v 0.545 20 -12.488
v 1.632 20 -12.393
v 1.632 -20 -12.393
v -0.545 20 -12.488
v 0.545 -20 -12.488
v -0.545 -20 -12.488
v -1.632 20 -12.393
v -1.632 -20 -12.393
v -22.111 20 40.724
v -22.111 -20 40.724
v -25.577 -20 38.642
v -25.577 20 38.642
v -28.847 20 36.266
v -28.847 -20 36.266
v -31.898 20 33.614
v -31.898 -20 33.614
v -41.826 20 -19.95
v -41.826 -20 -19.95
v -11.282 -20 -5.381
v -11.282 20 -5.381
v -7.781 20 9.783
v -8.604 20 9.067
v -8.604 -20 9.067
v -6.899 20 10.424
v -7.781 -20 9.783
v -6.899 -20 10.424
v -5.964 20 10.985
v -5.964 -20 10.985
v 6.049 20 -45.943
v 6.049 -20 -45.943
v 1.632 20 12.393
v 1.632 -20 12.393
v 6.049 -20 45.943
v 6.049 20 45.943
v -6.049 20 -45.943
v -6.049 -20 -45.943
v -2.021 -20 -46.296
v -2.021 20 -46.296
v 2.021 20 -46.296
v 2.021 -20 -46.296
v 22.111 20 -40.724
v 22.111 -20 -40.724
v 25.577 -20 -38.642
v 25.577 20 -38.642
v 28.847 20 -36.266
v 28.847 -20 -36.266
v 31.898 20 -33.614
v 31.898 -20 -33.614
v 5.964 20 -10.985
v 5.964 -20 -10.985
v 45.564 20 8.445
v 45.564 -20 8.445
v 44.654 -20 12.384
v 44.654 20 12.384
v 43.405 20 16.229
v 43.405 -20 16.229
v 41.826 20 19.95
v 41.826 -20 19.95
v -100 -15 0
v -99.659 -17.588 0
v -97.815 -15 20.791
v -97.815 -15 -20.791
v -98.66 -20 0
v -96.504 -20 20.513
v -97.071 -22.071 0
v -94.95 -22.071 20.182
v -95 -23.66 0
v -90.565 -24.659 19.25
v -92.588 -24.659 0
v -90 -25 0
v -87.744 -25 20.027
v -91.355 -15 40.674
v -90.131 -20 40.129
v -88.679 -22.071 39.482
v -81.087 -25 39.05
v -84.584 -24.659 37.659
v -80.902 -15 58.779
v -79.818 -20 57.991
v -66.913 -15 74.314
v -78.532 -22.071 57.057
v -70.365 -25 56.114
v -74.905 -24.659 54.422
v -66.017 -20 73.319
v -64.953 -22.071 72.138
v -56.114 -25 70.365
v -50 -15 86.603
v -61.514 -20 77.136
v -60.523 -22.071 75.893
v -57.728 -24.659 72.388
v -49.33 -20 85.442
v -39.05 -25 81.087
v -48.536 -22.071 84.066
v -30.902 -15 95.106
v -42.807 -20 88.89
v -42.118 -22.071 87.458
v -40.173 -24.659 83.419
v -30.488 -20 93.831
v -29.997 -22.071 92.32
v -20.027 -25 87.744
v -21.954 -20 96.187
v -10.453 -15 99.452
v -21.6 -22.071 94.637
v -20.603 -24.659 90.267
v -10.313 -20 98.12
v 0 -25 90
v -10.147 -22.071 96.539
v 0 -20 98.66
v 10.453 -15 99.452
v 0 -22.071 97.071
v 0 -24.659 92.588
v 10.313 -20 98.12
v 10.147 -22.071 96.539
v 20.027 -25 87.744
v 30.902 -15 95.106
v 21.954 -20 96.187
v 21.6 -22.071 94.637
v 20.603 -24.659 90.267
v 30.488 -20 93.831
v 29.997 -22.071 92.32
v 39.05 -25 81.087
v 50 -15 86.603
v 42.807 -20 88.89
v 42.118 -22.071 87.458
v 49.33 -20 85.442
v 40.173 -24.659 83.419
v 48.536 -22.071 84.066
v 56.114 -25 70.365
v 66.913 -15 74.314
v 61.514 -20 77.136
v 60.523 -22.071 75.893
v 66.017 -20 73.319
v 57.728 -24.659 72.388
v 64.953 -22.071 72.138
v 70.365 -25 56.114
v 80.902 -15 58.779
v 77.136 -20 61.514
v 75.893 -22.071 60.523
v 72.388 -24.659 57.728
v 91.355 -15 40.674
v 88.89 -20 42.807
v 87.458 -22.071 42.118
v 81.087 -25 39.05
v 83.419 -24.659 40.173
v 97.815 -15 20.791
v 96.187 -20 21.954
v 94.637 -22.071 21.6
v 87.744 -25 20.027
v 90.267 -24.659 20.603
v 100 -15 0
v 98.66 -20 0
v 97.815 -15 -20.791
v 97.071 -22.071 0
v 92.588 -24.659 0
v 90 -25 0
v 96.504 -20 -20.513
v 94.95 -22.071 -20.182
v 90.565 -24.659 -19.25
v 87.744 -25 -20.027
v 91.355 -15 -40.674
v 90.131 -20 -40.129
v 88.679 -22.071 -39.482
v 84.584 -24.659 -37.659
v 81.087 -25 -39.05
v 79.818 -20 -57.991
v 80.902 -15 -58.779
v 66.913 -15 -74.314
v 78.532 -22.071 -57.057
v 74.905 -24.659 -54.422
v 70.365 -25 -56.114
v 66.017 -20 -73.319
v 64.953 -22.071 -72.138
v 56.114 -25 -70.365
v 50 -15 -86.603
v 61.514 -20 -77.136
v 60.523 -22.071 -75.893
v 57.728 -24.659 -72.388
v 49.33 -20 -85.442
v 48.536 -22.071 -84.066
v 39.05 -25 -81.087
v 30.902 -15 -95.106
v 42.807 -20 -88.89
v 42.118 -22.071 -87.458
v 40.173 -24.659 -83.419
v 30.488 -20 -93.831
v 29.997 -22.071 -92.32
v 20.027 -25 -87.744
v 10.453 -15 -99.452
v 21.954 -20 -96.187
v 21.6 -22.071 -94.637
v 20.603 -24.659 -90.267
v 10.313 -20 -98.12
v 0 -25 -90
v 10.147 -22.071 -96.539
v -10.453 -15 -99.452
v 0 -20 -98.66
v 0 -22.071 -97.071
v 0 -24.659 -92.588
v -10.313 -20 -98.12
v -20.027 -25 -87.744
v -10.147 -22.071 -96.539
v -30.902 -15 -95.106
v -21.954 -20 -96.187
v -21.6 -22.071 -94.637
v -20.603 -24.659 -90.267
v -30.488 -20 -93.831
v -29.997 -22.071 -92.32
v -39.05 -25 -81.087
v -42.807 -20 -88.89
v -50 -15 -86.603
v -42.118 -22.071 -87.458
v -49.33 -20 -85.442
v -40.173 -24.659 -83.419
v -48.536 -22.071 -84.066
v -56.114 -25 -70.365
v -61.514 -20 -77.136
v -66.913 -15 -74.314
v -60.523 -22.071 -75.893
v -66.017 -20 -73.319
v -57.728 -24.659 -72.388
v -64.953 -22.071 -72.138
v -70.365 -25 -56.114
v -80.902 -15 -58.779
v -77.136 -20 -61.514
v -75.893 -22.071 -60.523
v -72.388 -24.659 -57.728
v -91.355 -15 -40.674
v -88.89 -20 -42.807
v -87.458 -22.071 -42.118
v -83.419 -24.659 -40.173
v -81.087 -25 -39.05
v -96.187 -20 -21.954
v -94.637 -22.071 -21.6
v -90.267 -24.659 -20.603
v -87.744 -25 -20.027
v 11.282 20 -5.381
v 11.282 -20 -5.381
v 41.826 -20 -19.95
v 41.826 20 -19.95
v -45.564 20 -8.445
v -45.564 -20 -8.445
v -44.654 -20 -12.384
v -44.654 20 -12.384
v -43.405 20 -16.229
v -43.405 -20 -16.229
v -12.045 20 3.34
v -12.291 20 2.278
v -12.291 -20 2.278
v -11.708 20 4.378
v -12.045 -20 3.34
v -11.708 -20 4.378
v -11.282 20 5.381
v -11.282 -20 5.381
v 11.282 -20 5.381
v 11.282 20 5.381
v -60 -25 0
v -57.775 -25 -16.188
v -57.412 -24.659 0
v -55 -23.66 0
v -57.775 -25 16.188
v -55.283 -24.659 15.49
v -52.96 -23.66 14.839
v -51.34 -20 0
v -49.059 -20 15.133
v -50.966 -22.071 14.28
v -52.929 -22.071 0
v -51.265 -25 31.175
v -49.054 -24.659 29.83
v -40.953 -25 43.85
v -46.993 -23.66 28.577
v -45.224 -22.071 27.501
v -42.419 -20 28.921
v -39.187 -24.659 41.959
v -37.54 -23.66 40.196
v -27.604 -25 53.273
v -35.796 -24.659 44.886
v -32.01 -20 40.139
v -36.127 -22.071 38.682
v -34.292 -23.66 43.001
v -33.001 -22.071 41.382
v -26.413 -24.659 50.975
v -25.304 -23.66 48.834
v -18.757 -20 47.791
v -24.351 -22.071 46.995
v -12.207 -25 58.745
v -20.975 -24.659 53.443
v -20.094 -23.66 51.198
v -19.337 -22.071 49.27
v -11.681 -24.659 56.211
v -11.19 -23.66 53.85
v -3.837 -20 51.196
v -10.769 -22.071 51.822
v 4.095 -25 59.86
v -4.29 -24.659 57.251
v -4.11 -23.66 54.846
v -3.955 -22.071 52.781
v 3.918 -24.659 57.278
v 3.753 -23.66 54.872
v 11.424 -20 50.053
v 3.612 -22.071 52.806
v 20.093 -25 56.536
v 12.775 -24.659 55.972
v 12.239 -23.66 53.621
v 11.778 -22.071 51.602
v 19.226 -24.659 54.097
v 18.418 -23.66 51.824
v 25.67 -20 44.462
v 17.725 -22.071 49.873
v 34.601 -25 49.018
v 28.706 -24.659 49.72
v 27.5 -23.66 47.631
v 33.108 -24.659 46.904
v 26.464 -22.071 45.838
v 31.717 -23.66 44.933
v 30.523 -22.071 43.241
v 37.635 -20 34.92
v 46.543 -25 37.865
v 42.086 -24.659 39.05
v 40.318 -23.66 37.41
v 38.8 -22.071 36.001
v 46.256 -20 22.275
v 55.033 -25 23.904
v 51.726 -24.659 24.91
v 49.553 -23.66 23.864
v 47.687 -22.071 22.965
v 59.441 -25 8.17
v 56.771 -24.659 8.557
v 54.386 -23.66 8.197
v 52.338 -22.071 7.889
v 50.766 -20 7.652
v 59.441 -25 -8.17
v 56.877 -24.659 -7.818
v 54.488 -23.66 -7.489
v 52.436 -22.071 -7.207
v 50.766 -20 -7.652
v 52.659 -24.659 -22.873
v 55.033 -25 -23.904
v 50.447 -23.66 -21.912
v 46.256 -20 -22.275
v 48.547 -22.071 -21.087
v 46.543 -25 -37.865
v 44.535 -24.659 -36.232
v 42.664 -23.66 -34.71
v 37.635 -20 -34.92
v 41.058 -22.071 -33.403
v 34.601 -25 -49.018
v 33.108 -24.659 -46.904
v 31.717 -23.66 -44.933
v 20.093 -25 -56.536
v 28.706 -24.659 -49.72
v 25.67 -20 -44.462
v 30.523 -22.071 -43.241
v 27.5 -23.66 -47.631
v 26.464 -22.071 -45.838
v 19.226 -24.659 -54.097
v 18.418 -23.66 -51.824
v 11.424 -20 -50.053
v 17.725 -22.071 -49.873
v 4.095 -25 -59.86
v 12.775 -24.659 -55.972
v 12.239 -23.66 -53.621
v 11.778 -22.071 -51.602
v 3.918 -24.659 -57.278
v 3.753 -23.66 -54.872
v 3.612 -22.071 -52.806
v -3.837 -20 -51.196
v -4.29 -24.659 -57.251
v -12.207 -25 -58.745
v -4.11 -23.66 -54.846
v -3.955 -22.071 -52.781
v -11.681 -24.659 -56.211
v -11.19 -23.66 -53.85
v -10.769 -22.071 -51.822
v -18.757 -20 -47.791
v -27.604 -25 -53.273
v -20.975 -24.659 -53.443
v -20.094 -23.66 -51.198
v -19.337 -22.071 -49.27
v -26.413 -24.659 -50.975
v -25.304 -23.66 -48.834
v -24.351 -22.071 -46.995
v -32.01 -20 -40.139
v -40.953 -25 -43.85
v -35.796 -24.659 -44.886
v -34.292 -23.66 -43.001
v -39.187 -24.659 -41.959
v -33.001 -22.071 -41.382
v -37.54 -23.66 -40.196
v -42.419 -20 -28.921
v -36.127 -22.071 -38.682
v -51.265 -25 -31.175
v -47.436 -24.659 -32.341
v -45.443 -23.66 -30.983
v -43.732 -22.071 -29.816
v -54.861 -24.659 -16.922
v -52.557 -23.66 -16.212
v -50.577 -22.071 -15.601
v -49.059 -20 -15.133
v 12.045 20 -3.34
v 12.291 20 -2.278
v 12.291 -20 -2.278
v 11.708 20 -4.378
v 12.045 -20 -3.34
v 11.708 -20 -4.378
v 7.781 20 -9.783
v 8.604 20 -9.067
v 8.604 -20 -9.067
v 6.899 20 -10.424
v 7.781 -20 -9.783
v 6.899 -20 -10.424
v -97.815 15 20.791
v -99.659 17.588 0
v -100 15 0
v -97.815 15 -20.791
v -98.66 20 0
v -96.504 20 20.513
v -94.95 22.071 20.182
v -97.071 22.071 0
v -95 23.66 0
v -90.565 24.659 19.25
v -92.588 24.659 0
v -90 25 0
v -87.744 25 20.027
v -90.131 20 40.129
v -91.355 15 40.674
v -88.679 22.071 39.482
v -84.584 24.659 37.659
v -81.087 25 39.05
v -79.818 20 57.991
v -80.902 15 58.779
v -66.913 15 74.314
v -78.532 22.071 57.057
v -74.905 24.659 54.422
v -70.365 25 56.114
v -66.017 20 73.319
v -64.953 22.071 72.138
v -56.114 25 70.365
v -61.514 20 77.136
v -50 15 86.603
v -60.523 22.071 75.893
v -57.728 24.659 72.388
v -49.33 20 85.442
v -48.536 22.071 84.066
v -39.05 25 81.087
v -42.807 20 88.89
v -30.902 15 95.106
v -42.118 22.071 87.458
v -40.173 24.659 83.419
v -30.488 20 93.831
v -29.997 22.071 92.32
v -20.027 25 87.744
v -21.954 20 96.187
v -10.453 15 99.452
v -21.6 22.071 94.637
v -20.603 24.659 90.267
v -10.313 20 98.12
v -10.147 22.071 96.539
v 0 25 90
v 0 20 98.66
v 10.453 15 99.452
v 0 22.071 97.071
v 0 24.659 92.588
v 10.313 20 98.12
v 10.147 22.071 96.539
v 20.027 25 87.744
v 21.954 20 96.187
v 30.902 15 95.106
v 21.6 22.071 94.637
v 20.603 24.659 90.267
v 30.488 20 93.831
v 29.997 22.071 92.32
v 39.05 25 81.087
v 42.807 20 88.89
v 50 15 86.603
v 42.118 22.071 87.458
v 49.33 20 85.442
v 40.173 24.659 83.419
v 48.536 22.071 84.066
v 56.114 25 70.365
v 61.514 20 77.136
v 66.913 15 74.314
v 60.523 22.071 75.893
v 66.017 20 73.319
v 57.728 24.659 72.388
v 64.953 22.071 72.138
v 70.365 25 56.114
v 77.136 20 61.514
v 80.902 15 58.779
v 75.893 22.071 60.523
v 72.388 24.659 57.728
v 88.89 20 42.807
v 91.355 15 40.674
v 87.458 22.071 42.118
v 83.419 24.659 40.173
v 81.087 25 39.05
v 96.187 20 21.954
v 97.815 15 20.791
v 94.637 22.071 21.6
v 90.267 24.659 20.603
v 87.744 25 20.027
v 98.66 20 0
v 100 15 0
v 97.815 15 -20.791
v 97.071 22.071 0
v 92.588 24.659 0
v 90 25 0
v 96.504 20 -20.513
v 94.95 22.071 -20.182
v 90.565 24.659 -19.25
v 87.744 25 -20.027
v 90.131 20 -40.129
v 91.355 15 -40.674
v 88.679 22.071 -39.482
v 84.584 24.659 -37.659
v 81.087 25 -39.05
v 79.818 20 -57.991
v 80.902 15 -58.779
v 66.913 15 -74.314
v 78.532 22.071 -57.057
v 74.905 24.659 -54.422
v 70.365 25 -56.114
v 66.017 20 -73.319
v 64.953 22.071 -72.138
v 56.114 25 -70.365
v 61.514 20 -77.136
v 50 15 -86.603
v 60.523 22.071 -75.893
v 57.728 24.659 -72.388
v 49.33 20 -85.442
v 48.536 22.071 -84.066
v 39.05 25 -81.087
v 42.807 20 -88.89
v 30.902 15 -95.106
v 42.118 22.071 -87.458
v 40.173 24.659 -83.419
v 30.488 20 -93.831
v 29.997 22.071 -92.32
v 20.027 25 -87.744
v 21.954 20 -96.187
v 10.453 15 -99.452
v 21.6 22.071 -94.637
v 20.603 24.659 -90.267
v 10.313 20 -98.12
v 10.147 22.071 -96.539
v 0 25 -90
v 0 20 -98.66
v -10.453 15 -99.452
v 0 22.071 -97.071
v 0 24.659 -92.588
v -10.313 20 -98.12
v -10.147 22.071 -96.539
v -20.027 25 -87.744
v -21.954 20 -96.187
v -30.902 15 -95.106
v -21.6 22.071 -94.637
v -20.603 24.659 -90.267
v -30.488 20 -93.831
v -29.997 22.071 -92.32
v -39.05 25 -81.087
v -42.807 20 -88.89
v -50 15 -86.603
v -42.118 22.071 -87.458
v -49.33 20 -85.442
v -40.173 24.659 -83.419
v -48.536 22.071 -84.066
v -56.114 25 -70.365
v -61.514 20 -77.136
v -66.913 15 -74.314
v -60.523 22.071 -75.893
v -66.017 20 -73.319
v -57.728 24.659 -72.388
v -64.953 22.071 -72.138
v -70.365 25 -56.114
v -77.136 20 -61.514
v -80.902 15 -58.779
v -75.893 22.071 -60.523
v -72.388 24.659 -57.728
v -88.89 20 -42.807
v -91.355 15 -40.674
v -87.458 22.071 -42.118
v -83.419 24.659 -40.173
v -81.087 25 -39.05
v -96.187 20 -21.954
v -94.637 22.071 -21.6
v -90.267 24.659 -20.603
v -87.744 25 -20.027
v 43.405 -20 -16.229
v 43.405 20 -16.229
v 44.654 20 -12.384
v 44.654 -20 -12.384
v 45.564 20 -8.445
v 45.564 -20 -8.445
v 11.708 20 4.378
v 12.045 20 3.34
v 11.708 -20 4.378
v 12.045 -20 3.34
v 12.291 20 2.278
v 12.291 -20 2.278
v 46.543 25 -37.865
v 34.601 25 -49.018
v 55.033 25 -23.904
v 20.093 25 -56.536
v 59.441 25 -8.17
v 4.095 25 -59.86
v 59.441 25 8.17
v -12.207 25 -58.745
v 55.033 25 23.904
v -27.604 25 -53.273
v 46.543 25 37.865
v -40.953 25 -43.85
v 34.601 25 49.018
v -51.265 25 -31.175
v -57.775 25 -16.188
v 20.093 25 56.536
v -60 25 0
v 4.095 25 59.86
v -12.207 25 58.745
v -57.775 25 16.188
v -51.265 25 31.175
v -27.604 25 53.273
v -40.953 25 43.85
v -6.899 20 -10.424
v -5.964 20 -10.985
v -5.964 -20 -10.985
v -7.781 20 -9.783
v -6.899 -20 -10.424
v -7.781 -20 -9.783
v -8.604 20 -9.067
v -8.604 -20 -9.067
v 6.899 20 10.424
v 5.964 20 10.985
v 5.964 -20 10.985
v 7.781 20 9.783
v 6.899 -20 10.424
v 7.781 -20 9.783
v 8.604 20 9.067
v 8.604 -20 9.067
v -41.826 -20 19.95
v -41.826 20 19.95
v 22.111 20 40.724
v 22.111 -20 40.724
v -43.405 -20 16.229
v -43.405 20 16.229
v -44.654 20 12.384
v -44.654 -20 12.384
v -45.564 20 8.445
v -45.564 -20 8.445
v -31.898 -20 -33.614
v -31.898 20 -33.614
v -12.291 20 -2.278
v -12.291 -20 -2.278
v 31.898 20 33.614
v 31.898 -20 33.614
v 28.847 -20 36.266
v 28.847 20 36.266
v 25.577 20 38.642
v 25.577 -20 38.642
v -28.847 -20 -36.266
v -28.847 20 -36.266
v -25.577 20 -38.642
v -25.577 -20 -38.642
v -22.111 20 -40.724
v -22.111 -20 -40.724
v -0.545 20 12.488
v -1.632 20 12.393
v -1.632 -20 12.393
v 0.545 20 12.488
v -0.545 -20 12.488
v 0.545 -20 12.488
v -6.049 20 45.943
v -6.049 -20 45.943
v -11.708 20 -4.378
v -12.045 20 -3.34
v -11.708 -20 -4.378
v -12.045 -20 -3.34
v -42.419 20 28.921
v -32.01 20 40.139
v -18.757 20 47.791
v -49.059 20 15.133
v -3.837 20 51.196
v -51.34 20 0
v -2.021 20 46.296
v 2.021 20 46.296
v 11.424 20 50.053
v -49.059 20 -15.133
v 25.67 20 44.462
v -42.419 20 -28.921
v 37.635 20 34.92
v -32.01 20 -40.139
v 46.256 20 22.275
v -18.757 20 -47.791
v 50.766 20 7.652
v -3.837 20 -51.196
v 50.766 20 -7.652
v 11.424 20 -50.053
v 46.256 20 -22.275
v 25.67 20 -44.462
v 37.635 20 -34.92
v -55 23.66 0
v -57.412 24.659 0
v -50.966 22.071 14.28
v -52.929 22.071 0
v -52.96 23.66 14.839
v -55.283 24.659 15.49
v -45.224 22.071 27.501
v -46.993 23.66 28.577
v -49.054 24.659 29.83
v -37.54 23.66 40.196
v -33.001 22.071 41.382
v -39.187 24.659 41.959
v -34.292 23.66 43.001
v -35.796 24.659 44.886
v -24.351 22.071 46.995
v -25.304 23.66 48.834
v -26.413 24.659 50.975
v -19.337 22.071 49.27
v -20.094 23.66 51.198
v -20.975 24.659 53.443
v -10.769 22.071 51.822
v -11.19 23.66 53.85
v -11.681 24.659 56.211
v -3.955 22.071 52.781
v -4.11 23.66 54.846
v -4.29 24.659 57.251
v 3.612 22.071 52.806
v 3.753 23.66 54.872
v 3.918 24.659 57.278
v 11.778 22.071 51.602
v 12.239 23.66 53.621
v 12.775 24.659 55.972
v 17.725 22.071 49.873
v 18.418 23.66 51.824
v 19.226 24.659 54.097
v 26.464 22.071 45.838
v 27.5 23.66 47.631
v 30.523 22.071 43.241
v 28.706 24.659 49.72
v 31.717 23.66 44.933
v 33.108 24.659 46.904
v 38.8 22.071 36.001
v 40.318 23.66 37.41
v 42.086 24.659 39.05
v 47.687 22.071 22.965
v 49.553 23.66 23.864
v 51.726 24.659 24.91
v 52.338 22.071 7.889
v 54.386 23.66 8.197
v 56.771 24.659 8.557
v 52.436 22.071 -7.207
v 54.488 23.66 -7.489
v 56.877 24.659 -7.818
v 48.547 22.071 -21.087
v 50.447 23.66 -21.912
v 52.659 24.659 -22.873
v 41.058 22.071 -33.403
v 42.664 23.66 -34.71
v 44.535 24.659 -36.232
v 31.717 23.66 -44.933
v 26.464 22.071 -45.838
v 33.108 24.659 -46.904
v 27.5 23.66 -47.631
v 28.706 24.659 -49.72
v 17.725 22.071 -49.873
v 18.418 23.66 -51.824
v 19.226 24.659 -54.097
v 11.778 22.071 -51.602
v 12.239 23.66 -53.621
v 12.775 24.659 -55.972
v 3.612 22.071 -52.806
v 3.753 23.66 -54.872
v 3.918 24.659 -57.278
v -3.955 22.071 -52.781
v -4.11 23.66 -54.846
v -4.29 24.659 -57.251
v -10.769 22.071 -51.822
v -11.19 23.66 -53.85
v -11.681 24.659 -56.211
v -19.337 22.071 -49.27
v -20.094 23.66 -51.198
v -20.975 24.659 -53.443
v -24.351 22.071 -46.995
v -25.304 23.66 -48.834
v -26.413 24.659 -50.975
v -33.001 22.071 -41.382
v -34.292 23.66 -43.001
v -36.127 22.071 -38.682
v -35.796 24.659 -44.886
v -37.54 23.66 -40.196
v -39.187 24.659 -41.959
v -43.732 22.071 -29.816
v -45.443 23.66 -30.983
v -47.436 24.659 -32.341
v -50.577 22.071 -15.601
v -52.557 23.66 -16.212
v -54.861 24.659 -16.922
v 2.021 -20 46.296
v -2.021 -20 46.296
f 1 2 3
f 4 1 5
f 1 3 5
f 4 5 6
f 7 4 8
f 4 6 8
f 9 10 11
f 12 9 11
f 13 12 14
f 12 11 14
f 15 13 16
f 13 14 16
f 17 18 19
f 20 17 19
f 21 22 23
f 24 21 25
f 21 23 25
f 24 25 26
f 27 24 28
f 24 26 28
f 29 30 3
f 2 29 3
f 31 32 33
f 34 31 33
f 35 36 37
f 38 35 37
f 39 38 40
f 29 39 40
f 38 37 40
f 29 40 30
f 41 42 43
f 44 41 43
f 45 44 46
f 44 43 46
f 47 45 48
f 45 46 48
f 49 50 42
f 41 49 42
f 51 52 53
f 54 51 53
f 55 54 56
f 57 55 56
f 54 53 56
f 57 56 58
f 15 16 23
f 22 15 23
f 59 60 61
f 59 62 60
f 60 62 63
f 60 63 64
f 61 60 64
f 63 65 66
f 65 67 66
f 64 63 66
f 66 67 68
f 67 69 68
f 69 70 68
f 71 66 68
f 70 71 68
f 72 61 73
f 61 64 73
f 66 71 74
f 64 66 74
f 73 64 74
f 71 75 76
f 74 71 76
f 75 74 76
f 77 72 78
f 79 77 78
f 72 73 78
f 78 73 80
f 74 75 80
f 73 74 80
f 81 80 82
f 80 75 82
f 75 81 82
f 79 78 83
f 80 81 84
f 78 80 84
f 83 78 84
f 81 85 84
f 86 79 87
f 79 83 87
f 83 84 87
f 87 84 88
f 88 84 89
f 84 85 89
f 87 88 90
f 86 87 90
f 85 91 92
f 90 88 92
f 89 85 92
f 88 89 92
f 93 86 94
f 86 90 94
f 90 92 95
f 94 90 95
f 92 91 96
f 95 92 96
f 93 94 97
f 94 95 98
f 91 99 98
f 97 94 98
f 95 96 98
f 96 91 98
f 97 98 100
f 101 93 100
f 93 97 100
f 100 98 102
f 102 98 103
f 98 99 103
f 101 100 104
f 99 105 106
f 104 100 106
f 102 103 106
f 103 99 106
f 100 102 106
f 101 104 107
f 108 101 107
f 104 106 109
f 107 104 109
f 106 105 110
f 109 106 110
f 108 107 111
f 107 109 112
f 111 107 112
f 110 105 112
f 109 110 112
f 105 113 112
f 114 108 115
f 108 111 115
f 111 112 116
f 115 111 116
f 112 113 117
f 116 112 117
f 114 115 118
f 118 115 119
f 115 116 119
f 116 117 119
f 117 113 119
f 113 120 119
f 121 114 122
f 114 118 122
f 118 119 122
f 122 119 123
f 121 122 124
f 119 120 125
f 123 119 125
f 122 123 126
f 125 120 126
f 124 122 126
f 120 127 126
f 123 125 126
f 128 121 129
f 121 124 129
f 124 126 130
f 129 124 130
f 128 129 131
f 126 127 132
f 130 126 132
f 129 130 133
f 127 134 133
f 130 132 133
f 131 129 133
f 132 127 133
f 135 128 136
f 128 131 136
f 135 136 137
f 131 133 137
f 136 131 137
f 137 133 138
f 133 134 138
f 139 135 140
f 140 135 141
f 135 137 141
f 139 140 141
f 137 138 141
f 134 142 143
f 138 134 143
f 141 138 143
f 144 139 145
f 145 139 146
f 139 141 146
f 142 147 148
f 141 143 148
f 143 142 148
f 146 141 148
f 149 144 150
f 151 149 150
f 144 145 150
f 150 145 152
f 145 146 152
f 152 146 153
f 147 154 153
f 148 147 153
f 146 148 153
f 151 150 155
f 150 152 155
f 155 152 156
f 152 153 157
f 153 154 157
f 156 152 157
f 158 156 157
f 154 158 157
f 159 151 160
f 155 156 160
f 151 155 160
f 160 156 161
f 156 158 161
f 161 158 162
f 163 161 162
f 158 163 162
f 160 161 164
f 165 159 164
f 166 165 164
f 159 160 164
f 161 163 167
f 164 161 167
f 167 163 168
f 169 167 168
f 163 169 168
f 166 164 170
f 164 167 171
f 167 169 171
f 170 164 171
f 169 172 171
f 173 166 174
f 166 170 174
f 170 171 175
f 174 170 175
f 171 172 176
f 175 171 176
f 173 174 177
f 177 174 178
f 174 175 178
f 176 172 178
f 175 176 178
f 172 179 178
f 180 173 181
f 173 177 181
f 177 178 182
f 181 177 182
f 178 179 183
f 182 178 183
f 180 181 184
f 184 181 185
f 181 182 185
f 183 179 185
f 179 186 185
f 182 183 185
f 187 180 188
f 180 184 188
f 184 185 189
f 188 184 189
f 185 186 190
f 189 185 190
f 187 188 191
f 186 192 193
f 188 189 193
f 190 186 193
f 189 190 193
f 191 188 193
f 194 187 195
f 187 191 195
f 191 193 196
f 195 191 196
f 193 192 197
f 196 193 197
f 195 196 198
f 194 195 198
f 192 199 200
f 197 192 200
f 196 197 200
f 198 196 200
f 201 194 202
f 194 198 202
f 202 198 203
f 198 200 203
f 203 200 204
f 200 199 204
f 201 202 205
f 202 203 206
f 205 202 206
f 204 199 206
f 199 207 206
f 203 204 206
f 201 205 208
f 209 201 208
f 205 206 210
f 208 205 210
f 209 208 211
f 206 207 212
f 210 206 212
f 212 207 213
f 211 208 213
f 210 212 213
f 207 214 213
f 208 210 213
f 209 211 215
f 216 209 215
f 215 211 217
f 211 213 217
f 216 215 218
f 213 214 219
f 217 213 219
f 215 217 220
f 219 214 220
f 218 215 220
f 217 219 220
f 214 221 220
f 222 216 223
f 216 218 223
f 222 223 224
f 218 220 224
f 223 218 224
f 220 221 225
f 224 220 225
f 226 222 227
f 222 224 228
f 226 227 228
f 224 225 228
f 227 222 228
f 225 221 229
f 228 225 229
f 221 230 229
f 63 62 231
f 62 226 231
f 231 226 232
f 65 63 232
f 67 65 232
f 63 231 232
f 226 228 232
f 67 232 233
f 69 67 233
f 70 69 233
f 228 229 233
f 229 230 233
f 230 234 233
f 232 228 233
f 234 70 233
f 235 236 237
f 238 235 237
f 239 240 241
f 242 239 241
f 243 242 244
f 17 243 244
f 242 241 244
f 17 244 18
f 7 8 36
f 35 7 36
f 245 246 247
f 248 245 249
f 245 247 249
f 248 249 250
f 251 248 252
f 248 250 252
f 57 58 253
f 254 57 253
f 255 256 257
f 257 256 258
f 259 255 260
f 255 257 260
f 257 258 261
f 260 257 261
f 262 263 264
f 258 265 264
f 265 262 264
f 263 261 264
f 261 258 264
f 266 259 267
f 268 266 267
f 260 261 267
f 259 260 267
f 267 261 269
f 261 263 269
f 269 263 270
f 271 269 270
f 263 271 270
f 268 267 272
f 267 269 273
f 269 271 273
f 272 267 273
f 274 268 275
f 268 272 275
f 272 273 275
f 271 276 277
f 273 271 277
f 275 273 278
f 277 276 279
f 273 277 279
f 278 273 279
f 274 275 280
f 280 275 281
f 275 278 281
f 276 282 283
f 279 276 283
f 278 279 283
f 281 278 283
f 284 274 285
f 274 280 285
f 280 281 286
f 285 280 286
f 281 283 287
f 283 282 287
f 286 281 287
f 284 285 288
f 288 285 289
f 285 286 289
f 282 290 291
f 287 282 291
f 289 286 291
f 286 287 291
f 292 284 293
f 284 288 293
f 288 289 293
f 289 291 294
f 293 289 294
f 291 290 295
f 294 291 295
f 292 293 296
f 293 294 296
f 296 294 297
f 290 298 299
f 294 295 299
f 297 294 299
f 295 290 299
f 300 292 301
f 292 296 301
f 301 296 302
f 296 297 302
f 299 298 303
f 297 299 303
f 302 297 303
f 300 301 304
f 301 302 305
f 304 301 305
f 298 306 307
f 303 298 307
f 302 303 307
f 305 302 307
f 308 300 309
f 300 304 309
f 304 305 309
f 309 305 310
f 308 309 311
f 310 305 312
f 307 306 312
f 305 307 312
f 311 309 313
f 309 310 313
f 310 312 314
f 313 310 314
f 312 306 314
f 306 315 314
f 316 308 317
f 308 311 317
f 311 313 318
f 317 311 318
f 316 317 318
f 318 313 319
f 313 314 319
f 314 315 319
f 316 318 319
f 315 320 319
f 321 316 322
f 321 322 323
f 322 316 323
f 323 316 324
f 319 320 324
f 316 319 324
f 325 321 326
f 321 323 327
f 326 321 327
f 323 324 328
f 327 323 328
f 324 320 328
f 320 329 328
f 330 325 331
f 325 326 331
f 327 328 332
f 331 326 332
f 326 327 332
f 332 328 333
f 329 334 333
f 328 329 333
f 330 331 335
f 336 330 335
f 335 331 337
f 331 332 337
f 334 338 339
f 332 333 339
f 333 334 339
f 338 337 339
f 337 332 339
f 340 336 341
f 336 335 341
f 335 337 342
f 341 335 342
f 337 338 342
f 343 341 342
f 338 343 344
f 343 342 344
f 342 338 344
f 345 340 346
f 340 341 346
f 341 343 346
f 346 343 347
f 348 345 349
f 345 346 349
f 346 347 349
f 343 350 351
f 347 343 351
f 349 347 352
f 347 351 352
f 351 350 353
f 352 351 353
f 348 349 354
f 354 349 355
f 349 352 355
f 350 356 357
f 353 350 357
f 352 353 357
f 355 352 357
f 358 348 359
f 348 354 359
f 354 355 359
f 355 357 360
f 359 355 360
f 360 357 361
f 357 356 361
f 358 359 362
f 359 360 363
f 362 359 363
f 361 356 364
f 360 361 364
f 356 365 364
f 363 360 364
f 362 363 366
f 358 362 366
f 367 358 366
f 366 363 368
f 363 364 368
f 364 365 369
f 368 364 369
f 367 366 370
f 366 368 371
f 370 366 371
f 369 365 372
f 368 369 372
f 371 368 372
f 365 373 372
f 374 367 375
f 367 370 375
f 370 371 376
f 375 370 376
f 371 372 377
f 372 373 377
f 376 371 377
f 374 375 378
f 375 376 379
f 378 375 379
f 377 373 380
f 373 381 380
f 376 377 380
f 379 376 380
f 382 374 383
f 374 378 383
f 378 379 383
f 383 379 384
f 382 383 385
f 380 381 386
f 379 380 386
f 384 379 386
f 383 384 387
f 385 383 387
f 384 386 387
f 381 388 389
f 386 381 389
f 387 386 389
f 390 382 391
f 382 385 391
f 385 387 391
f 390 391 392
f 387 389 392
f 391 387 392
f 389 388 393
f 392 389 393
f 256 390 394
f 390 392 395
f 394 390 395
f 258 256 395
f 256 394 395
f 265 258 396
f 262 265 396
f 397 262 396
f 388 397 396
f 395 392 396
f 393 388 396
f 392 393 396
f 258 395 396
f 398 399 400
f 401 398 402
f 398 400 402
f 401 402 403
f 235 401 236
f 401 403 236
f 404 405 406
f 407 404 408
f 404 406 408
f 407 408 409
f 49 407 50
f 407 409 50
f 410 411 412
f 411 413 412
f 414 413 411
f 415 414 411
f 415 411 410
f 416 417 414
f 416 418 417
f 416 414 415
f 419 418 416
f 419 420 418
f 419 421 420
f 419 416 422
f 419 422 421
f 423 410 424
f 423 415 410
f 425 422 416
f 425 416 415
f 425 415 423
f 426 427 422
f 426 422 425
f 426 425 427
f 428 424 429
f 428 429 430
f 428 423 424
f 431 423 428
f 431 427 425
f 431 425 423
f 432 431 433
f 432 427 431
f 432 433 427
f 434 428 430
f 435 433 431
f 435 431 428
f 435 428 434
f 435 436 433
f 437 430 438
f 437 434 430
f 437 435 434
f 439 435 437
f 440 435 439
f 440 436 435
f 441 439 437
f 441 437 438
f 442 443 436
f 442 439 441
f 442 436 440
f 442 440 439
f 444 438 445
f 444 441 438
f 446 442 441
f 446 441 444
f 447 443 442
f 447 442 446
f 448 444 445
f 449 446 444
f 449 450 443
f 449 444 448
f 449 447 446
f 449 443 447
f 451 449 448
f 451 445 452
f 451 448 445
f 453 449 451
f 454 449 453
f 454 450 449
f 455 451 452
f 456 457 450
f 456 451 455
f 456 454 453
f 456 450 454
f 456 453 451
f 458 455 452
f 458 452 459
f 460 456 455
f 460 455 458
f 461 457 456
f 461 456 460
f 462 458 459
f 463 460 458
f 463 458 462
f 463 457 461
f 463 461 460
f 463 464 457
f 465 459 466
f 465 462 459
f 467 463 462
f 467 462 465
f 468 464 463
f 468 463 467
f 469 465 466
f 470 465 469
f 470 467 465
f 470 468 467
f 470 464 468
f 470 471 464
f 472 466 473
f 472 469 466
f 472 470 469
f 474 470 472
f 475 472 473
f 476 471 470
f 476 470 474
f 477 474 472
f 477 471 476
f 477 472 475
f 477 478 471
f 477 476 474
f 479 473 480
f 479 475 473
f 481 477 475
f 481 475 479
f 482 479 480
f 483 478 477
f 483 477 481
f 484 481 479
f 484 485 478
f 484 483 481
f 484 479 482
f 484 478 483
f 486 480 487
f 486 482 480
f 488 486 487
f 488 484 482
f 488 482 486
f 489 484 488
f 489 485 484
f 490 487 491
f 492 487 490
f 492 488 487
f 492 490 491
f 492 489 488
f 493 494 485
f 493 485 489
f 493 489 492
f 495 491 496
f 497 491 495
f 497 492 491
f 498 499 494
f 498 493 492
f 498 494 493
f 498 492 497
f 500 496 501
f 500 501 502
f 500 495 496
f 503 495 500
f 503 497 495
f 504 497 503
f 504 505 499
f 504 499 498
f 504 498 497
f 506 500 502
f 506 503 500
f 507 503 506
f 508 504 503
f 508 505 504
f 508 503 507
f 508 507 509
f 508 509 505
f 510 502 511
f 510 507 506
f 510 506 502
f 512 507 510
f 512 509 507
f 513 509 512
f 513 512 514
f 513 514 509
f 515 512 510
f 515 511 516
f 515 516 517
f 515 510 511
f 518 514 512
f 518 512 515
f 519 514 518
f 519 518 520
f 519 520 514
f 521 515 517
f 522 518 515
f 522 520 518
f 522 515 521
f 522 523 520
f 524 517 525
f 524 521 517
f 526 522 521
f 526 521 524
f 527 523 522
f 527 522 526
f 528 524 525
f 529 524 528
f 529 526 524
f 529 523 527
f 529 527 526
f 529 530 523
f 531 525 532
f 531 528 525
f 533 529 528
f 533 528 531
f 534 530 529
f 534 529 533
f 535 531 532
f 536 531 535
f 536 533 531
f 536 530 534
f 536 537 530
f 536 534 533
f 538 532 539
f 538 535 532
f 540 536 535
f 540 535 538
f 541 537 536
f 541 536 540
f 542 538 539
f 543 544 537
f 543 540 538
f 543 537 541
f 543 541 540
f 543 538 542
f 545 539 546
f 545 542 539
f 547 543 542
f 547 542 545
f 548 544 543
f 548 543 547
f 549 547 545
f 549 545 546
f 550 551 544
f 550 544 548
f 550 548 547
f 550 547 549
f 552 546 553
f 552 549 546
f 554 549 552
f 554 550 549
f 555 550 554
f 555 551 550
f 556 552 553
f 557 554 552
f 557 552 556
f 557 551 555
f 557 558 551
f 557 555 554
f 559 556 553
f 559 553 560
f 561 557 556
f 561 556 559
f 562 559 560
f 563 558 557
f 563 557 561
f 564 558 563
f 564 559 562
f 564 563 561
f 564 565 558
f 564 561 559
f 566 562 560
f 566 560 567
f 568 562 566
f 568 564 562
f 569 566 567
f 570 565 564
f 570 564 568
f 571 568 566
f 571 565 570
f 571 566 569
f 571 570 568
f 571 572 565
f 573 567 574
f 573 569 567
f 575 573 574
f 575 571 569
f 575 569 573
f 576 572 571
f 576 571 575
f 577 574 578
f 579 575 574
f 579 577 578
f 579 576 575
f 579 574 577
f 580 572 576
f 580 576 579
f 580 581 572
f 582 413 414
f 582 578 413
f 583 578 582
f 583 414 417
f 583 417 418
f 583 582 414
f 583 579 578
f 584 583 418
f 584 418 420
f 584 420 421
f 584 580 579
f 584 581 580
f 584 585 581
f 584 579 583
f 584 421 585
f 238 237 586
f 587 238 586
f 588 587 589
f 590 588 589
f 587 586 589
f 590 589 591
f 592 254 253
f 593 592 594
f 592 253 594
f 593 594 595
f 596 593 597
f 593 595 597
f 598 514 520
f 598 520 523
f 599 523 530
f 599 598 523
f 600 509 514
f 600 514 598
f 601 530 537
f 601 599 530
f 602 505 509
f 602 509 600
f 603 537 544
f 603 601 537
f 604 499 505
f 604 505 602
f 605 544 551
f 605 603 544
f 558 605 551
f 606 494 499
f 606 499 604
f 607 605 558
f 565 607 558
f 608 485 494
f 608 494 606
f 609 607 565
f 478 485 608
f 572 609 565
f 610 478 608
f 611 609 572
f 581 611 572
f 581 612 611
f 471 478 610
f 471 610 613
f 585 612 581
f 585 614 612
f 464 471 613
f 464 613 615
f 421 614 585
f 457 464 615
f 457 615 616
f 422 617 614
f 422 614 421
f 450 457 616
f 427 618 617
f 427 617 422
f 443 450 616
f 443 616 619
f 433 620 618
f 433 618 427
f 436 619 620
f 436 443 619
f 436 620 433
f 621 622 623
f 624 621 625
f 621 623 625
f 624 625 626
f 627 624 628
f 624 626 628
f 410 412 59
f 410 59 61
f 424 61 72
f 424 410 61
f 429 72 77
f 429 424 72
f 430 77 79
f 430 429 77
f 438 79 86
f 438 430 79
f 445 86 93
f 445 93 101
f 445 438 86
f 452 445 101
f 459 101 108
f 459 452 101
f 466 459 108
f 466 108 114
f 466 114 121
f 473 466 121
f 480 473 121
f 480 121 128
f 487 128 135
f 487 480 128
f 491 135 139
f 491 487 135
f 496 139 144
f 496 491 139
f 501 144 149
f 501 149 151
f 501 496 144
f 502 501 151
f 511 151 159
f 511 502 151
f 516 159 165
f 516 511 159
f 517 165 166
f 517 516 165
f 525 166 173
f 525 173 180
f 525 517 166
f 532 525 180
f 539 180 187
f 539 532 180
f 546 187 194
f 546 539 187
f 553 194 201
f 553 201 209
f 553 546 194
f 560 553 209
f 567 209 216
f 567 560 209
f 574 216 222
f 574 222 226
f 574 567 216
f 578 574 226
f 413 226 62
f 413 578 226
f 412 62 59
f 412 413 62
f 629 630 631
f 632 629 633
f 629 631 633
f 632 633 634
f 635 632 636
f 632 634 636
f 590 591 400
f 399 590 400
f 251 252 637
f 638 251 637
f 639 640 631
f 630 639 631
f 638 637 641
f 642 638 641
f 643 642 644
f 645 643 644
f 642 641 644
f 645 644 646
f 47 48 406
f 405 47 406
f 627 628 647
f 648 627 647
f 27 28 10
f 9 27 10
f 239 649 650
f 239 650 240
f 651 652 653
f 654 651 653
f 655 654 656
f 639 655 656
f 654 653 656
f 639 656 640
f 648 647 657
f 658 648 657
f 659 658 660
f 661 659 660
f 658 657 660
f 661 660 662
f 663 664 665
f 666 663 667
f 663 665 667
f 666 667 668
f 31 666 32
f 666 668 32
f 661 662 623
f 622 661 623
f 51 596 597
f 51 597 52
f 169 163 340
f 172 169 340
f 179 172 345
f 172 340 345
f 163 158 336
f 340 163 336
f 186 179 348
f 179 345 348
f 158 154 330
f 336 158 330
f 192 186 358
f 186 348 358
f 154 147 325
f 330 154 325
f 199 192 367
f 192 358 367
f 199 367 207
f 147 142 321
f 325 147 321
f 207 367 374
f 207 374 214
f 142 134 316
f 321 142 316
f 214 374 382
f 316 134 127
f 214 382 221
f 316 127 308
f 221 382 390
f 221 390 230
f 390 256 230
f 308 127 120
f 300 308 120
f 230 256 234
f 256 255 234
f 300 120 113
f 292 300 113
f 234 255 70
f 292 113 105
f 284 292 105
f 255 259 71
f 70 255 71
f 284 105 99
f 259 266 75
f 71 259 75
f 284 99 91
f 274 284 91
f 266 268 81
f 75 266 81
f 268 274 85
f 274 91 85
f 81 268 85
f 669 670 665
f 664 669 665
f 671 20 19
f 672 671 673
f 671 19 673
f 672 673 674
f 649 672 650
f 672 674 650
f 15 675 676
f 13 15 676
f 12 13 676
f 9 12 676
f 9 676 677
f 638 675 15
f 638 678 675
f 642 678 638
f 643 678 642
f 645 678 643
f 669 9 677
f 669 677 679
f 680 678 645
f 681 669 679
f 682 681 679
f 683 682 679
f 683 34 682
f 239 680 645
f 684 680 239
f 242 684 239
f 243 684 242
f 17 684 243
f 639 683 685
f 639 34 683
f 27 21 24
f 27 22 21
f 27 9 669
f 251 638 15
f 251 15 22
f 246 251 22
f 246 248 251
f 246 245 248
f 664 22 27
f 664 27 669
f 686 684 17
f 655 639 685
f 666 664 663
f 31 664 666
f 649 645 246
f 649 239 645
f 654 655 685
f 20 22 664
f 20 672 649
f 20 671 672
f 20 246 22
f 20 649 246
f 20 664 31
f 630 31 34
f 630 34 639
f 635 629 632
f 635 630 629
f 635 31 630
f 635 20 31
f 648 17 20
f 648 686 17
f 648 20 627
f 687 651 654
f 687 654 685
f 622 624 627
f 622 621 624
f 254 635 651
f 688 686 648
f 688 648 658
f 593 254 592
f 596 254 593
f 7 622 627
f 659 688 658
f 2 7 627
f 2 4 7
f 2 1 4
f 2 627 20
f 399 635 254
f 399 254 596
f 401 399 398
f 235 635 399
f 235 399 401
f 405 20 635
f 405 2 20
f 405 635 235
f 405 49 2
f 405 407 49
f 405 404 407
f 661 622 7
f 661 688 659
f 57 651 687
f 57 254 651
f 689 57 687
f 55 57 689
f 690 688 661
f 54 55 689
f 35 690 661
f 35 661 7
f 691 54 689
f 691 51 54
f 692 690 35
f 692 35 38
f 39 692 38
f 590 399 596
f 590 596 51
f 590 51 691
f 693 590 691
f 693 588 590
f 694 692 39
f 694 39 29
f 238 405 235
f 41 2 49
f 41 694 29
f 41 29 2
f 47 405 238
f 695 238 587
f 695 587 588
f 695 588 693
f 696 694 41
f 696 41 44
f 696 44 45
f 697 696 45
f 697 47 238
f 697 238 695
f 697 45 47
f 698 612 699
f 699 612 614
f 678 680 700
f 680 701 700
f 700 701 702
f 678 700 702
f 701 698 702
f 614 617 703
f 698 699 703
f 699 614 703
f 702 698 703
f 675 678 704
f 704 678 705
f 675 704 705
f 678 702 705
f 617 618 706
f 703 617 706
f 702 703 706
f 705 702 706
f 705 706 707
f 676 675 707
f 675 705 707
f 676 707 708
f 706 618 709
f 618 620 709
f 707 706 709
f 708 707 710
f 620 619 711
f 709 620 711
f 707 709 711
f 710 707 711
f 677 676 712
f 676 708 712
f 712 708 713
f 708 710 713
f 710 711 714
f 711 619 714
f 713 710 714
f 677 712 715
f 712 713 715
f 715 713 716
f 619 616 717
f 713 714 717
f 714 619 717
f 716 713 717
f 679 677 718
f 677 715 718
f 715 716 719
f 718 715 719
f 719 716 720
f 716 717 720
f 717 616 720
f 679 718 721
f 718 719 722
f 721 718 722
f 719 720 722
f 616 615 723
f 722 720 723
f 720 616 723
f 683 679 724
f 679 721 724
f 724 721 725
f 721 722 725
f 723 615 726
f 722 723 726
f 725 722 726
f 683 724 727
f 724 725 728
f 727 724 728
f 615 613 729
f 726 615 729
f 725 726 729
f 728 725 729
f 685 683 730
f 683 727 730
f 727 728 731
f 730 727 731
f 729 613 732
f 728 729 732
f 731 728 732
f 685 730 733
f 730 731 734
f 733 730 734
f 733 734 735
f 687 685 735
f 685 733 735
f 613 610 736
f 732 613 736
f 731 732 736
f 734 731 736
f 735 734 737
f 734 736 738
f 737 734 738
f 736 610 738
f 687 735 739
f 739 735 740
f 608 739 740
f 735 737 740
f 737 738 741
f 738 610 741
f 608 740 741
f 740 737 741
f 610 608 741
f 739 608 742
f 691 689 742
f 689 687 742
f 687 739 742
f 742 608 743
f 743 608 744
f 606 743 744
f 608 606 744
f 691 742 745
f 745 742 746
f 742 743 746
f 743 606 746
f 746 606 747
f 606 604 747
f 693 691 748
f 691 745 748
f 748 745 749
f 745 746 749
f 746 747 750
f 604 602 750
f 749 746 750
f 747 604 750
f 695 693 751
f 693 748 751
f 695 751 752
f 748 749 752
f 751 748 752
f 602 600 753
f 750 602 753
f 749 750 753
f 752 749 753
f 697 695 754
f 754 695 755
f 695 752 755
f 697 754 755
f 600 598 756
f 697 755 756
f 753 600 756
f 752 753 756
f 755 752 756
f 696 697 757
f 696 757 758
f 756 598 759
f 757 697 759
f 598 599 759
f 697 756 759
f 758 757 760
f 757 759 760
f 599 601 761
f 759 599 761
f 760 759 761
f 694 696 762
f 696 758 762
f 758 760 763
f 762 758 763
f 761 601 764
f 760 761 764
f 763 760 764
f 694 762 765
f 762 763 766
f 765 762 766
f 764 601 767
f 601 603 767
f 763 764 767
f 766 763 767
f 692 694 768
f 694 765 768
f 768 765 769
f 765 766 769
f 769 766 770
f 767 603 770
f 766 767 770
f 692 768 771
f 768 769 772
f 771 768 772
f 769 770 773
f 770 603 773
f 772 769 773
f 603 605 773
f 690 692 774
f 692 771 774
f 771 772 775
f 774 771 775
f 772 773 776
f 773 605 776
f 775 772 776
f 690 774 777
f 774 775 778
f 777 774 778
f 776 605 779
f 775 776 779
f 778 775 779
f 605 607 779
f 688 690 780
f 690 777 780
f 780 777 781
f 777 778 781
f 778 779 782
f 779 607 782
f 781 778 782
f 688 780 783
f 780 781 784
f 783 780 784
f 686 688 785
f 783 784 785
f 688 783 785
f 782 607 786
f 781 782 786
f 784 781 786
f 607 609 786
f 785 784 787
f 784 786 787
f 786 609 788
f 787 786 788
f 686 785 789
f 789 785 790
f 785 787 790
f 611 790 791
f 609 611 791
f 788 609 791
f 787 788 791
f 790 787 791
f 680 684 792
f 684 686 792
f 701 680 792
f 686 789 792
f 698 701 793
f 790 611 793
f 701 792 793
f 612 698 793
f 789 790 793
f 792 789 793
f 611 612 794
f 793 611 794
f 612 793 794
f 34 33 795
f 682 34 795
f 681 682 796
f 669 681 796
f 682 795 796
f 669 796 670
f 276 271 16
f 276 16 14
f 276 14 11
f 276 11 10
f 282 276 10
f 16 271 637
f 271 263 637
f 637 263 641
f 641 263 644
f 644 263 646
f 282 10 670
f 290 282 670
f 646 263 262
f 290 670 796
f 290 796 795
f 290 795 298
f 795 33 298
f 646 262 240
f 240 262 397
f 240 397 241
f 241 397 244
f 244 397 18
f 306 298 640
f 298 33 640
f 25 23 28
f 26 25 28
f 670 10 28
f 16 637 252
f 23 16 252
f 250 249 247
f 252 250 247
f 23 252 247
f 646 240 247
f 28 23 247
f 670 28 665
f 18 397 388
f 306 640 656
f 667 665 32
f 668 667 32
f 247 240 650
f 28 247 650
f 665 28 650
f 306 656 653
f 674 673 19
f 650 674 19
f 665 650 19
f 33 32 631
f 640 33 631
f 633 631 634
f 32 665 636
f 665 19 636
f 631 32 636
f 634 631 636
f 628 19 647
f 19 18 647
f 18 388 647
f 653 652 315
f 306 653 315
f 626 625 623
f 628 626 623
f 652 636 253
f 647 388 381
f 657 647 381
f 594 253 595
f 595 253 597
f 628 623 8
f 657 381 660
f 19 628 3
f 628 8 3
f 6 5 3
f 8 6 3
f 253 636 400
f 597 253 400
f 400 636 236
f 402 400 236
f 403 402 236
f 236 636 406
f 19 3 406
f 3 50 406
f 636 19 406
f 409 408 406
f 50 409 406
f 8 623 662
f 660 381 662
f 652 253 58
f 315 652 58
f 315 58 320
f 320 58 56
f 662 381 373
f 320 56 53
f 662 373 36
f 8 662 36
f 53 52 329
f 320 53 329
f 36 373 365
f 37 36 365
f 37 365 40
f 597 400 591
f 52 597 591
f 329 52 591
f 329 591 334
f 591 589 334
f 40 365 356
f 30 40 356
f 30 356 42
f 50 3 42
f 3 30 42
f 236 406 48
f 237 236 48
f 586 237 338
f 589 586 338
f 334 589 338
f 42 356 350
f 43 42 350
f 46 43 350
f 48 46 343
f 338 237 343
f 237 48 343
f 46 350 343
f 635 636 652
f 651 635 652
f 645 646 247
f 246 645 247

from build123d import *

# Parameters (mm, degrees)
SKETCH2_W                = 50
SKETCH2_H                = 50
FILLET2_R                = 10
SKETCH3_R                = 60
BOSS_EXTRUDE2_DEPTH      = 20
BOSS_EXTRUDE2_DEPTH_BACK = 20
CUT_EXTRUDE1_DEPTH       = 46
CIRPATTERN1_COUNT        = 10


with BuildPart() as part:
    # Sketch2 → Revolve1 (revolve)
    with BuildSketch(Plane.XY):
        with Locations((-75, 0)):
            Rectangle(SKETCH2_W, SKETCH2_H)
    revolve(axis=Axis((0, 0, 0), (0, 1, 0)))

    # Fillet2
    fillet2_edges = [part.edges().sort_by_distance(p)[0] for p in [
        (50, 25, 0),
        (100, 25, 0),
        (100, -25, 0),
        (50, -25, 0),
    ]]
    fillet(fillet2_edges, radius=FILLET2_R)

    # Sketch3 → Boss-Extrude2 (add, two sides)
    with BuildSketch(Plane(origin=(0, 0, 0), x_dir=(1, 0, 0), z_dir=(0, 1, 0))) as boss_extrude2_sk:
        Circle(SKETCH3_R)
    extrude(amount=BOSS_EXTRUDE2_DEPTH)
    extrude(boss_extrude2_sk.sketch, amount=-BOSS_EXTRUDE2_DEPTH_BACK)

    # Sketch4 → Cut-Extrude1 (cut, through all)
    with BuildSketch(Plane.XZ.offset(20)):
        with BuildLine():
            ThreePointArc((-1.631577403, 12.393060767), (0, 12.5), (1.631577403, 12.393060767))
            Line((1.631577403, 12.393060767), (6.048550589, 45.943303012))
            ThreePointArc((6.048550589, 45.943303012), (0, 46.339745962), (-6.048550589, 45.943303012))
            Line((-6.048550589, 45.943303012), (-1.631577403, 12.393060767))
        make_face()
    cut_extrude1 = extrude(amount=-CUT_EXTRUDE1_DEPTH, mode=Mode.SUBTRACT)

    # CirPattern1: Cut-Extrude1 ×10 about axis
    cirpattern1_axis = Axis((0, 0, 0), (0, 1, 0))
    for i in range(1, CIRPATTERN1_COUNT):
        add(cut_extrude1.rotate(cirpattern1_axis, i * 360 / CIRPATTERN1_COUNT), mode=Mode.SUBTRACT)


solid = part.part
